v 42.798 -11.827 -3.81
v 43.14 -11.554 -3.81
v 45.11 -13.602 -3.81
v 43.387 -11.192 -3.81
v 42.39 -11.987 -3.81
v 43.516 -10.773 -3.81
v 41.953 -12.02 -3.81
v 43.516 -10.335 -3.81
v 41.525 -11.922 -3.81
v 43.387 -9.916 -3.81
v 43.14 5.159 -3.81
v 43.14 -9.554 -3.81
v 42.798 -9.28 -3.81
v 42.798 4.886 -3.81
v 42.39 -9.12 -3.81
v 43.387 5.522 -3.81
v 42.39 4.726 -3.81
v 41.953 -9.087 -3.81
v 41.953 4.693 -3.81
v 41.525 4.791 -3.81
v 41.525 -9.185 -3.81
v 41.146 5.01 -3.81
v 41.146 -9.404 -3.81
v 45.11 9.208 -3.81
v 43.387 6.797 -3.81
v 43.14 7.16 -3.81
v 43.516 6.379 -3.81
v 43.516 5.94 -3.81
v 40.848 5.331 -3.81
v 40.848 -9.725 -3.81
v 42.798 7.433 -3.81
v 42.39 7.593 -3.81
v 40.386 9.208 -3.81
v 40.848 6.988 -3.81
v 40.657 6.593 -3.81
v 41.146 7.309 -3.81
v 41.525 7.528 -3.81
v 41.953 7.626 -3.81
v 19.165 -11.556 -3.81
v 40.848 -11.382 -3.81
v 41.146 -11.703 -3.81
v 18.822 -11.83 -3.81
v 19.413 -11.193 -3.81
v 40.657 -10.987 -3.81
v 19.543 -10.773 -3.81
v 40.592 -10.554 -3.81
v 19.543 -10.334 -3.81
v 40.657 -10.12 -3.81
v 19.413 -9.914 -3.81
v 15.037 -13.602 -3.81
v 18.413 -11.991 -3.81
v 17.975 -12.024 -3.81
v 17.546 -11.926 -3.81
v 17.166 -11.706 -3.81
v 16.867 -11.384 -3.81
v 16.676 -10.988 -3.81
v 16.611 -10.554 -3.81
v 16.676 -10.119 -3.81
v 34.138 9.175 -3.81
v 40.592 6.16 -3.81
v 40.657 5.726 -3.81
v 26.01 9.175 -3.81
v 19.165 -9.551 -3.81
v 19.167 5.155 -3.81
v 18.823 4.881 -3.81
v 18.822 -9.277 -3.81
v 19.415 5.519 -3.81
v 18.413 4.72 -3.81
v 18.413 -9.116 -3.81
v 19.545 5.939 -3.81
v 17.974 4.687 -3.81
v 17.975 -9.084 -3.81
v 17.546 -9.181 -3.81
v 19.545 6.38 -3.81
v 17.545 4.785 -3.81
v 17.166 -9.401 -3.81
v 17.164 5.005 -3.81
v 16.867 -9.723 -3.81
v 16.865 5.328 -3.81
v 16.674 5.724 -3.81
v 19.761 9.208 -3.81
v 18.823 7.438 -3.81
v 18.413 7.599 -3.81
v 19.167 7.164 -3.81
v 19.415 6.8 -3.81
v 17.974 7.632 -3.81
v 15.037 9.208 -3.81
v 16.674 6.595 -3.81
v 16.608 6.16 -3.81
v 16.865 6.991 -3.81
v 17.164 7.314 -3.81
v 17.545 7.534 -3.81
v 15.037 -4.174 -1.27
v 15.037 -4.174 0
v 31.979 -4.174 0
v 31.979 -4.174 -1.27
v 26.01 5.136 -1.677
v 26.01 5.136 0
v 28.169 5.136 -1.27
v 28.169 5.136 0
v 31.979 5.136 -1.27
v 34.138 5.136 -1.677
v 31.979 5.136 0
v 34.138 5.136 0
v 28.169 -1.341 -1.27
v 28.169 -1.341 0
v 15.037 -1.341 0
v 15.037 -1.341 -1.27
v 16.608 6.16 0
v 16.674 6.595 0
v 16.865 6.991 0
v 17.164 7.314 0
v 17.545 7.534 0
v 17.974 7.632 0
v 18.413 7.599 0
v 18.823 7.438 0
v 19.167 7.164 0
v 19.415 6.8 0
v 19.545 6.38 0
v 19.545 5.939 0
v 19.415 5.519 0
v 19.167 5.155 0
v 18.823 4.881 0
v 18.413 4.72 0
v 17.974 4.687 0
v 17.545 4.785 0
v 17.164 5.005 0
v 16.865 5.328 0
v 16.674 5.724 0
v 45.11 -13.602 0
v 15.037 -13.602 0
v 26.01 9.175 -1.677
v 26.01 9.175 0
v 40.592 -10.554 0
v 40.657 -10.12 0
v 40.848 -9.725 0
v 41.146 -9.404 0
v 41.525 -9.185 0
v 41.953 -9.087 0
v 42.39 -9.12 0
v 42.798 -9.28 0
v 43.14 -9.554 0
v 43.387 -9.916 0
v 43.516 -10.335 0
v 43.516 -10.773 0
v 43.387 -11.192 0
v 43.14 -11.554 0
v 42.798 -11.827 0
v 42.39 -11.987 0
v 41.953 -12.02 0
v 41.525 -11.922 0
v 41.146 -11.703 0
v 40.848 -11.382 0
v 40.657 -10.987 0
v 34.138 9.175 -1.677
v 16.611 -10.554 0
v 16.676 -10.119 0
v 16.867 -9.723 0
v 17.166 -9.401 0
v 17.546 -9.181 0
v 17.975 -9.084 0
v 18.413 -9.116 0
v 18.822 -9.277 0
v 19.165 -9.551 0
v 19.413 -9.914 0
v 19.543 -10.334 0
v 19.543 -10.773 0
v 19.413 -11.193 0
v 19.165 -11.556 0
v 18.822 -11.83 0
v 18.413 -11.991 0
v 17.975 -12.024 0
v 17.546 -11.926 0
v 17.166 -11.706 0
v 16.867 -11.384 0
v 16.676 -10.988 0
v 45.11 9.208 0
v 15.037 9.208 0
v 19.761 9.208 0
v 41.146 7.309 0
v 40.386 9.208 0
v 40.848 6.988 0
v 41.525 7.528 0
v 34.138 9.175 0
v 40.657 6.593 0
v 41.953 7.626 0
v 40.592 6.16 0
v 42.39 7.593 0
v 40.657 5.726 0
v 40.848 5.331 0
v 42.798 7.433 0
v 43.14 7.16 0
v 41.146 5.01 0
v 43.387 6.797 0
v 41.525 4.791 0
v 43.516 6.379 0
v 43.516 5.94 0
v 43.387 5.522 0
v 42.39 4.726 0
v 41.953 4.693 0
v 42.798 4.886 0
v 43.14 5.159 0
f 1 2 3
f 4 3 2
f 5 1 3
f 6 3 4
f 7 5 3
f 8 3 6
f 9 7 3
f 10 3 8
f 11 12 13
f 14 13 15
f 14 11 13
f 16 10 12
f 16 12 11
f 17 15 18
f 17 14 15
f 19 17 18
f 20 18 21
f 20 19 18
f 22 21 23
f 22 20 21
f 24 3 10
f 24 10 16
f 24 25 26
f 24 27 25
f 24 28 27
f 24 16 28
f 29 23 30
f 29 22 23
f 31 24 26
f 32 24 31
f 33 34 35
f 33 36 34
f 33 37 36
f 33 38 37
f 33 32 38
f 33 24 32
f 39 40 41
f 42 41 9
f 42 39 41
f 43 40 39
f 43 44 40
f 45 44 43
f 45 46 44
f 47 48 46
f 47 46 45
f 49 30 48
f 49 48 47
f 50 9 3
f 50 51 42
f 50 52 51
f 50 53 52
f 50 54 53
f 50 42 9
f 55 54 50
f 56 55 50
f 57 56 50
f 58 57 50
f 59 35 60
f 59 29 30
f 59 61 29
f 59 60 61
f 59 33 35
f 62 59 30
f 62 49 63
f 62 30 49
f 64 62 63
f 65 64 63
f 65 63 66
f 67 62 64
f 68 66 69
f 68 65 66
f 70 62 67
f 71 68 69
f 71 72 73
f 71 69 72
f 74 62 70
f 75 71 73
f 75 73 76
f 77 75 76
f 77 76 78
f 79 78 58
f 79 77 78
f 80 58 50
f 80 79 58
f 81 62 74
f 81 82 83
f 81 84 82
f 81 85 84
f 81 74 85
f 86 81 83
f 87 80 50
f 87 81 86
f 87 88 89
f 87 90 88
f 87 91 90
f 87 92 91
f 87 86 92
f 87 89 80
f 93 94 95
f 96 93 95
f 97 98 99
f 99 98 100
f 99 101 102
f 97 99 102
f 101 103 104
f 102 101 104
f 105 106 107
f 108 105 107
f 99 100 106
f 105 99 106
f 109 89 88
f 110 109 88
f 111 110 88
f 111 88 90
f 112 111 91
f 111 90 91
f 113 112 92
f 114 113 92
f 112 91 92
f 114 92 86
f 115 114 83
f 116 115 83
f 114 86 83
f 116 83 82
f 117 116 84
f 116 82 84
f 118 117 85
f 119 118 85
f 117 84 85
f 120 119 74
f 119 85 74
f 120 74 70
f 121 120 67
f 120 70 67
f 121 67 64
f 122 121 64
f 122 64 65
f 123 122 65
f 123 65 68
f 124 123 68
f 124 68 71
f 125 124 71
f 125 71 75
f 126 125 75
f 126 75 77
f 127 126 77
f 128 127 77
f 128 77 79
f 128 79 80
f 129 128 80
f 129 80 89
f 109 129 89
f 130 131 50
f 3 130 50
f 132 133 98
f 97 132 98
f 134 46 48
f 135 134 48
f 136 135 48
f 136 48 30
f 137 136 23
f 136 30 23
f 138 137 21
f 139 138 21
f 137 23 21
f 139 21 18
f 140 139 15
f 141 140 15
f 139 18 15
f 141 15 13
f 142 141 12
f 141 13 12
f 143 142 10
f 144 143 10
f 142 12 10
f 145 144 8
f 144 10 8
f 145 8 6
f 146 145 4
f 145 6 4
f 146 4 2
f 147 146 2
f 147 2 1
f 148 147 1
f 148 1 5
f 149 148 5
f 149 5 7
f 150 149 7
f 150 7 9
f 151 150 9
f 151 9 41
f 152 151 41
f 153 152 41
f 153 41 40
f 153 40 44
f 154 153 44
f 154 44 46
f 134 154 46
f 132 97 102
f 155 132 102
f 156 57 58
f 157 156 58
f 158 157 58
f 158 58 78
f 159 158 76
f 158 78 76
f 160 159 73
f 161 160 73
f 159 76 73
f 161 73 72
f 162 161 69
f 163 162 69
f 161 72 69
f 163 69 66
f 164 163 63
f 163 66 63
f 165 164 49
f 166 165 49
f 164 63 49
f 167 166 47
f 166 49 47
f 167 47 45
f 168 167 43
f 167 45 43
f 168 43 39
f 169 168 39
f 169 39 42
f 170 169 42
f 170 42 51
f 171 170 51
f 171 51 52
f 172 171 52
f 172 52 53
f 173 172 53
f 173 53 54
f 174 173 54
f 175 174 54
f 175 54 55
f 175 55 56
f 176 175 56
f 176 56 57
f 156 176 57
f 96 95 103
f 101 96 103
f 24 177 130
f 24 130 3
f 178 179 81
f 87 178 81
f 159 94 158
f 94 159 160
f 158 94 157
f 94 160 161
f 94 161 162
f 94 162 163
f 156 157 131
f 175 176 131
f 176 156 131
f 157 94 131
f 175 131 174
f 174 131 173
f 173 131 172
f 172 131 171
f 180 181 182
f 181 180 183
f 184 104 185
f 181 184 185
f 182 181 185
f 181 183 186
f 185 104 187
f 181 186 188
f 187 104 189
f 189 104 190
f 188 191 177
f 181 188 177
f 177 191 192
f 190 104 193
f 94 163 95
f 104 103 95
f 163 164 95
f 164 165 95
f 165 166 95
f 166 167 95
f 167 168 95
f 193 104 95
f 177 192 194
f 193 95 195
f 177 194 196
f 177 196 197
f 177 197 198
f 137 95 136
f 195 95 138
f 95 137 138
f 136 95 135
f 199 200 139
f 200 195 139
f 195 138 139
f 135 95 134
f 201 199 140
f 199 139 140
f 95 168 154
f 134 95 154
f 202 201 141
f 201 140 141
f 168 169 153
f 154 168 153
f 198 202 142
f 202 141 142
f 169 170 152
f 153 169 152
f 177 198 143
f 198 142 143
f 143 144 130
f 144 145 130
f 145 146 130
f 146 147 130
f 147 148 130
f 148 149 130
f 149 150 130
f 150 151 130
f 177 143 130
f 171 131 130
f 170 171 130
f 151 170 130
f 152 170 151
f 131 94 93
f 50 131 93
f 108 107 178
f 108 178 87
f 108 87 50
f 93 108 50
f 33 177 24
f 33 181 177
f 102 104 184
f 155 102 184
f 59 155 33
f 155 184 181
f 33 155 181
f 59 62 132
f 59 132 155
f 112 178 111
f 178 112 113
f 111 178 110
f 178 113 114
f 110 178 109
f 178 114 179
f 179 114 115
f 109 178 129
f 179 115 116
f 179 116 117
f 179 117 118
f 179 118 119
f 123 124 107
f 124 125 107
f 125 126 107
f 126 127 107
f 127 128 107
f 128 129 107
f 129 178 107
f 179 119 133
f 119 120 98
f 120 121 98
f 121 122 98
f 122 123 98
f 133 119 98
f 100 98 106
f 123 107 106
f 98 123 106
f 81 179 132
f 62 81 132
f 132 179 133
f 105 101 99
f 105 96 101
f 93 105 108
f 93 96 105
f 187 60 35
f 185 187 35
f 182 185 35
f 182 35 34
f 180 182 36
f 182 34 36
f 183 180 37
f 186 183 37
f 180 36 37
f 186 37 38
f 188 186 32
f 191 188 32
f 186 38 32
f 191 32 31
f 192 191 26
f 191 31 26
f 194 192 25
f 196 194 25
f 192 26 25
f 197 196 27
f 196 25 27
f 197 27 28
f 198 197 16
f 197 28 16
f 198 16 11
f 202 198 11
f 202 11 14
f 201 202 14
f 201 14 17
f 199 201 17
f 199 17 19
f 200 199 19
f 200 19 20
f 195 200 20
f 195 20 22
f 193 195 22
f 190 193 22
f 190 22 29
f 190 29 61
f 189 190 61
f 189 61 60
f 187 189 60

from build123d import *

# Parameters (mm, degrees)
F1_DEPTH   = 3.81
F2_W       = 8.128
F2_H       = 1.905
F1_FACE1_W = 20.6248
F1_FACE1_H = 3.81
F3_DEPTH   = 1.8542
F4_DEPTH   = 2.1844
F5_DEPTH   = 2.1844
F6_W       = 8.128
F6_H       = 2.1333807143
F7_DEPTH   = 6.096
F8_DEPTH   = 2.54
F9_DEPTH   = 2.54
F10_DEPTH  = 2.54
F11_DEPTH  = 6.096
F12_R      = 1.4742196791
F12_R_2    = 1.4703350309
F12_R_3    = 1.4763746717
F12_R_4    = 1.4703336231
F13_DEPTH  = 25.4
F16_DEPTH  = 2.0574
F18_DEPTH  = 1.27
F19_ANGLE  = -180


with BuildPart() as f1:
    # F0 (on Top) → F1 (new body)
    with BuildSketch(Plane.XY):
        Polygon((-10.3124, -9.2075), (10.3124, -9.2075), (10.3124, 9.2075), (4.064, 9.1750113802), (4.064, 3.0790113802), (-4.064, 3.0790113802), (-4.064, 9.1750113802), (-10.3124, 9.2075), align=None)
    extrude(amount=F1_DEPTH)

    # F2 (on face) + F1_face1 (on face) → F3 (join)
    with BuildSketch(Plane(origin=(0, 3.0790113802, 0), x_dir=(-1, 0, 0), z_dir=(0, 1, 0))):
        with Locations((0, 2.8575)):
            Rectangle(F2_W, F2_H)
    with BuildSketch(Plane(origin=(0, -9.2075, 1.905), x_dir=(1, 0, 0), z_dir=(0, -1, 0))):
        Rectangle(F1_FACE1_W, F1_FACE1_H)
    extrude(amount=-F3_DEPTH, dir=(0, 1, 0))

    # F4 (add): a face of the model
    f4_faces = [f1.faces().sort_by_distance(p)[0] for p in [
        (-10.3124, -0.9271, 1.905),
    ]]
    extrude(f4_faces, amount=F4_DEPTH)

    # F5 (add): a face of the model
    f5_faces = [f1.faces().sort_by_distance(p)[0] for p in [
        (10.3124, -0.9271, 1.905),
    ]]
    extrude(f5_faces, amount=F5_DEPTH)

    # F6 (on face) → F7 (join)
    with BuildSketch(Plane(origin=(0, 3.0790113802, 0), x_dir=(-1, 0, 0), z_dir=(0, 1, 0))):
        with Locations((0, 2.7433096429)):
            Rectangle(F6_W, F6_H)
    extrude(amount=F7_DEPTH)

    # F8 (add): a face of the model
    f8_faces = [f1.faces().sort_by_distance(p)[0] for p in [
        (-12.4968, -0.9271, 1.905),
    ]]
    extrude(f8_faces, amount=F8_DEPTH)

    # F9 (add): a face of the model
    f9_faces = [f1.faces().sort_by_distance(p)[0] for p in [
        (12.4968, -0.9271, 1.905),
    ]]
    extrude(f9_faces, amount=F9_DEPTH)

    # F10 (add): a face of the model
    f10_faces = [f1.faces().sort_by_distance(p)[0] for p in [
        (0, -11.0617, 1.905),
    ]]
    extrude(f10_faces, amount=F10_DEPTH)

    # F11 (cut): a face of the model
    f11_faces = [f1.faces().sort_by_distance(p)[0] for p in [
        (0, 3.0790113802, 0.8383096429),
    ]]
    extrude(f11_faces, amount=F11_DEPTH, mode=Mode.SUBTRACT)

    # F12 (on face) → F13 (cut)
    with BuildSketch(Plane.XY.offset(3.81)):
        with Locations((11.9888, -10.5537)):
            Circle(F12_R)
        with Locations((-11.9888, -10.5537)):
            Circle(F12_R_2)
        with Locations((11.9888, 6.1595)):
            Circle(F12_R_3)
        with Locations((-11.9888, 6.1595)):
            Circle(F12_R_4)
    extrude(amount=-F13_DEPTH, mode=Mode.SUBTRACT)


with BuildPart() as f14_1:
    # F14: copy of F1
    add(f1.part.moved(Location((0, -28.956, 0))))


with BuildPart() as f1_1:
    add(f1.part)

    # F16 (add): a face of the model
    f16_faces = [f1_1.faces().sort_by_distance(p)[0] for p in [
        (0, 3.0790113802, 0.8383096429),
    ]]
    extrude(f16_faces, amount=F16_DEPTH)

    # F17 (on face) → F18 (cut)
    with BuildSketch(Plane(origin=(0, 0, 0), x_dir=(1, 0, 0), z_dir=(0, 0, -1))):
        Polygon((-1.905, -5.1364113802), (1.905, -5.1364113802), (1.905, 1.340843155), (15.0368, 1.340843155), (15.0368, 4.1735726409), (-1.905, 4.1735726409), align=None)
    extrude(amount=-F18_DEPTH, mode=Mode.SUBTRACT)


with BuildPart() as f1_2:
    # F19: moved
    add(f1_1.part.rotate(Axis((15.0368, -8.8876363204, 0), (0, -1, 0)), F19_ANGLE))


solid = f1_2.part
